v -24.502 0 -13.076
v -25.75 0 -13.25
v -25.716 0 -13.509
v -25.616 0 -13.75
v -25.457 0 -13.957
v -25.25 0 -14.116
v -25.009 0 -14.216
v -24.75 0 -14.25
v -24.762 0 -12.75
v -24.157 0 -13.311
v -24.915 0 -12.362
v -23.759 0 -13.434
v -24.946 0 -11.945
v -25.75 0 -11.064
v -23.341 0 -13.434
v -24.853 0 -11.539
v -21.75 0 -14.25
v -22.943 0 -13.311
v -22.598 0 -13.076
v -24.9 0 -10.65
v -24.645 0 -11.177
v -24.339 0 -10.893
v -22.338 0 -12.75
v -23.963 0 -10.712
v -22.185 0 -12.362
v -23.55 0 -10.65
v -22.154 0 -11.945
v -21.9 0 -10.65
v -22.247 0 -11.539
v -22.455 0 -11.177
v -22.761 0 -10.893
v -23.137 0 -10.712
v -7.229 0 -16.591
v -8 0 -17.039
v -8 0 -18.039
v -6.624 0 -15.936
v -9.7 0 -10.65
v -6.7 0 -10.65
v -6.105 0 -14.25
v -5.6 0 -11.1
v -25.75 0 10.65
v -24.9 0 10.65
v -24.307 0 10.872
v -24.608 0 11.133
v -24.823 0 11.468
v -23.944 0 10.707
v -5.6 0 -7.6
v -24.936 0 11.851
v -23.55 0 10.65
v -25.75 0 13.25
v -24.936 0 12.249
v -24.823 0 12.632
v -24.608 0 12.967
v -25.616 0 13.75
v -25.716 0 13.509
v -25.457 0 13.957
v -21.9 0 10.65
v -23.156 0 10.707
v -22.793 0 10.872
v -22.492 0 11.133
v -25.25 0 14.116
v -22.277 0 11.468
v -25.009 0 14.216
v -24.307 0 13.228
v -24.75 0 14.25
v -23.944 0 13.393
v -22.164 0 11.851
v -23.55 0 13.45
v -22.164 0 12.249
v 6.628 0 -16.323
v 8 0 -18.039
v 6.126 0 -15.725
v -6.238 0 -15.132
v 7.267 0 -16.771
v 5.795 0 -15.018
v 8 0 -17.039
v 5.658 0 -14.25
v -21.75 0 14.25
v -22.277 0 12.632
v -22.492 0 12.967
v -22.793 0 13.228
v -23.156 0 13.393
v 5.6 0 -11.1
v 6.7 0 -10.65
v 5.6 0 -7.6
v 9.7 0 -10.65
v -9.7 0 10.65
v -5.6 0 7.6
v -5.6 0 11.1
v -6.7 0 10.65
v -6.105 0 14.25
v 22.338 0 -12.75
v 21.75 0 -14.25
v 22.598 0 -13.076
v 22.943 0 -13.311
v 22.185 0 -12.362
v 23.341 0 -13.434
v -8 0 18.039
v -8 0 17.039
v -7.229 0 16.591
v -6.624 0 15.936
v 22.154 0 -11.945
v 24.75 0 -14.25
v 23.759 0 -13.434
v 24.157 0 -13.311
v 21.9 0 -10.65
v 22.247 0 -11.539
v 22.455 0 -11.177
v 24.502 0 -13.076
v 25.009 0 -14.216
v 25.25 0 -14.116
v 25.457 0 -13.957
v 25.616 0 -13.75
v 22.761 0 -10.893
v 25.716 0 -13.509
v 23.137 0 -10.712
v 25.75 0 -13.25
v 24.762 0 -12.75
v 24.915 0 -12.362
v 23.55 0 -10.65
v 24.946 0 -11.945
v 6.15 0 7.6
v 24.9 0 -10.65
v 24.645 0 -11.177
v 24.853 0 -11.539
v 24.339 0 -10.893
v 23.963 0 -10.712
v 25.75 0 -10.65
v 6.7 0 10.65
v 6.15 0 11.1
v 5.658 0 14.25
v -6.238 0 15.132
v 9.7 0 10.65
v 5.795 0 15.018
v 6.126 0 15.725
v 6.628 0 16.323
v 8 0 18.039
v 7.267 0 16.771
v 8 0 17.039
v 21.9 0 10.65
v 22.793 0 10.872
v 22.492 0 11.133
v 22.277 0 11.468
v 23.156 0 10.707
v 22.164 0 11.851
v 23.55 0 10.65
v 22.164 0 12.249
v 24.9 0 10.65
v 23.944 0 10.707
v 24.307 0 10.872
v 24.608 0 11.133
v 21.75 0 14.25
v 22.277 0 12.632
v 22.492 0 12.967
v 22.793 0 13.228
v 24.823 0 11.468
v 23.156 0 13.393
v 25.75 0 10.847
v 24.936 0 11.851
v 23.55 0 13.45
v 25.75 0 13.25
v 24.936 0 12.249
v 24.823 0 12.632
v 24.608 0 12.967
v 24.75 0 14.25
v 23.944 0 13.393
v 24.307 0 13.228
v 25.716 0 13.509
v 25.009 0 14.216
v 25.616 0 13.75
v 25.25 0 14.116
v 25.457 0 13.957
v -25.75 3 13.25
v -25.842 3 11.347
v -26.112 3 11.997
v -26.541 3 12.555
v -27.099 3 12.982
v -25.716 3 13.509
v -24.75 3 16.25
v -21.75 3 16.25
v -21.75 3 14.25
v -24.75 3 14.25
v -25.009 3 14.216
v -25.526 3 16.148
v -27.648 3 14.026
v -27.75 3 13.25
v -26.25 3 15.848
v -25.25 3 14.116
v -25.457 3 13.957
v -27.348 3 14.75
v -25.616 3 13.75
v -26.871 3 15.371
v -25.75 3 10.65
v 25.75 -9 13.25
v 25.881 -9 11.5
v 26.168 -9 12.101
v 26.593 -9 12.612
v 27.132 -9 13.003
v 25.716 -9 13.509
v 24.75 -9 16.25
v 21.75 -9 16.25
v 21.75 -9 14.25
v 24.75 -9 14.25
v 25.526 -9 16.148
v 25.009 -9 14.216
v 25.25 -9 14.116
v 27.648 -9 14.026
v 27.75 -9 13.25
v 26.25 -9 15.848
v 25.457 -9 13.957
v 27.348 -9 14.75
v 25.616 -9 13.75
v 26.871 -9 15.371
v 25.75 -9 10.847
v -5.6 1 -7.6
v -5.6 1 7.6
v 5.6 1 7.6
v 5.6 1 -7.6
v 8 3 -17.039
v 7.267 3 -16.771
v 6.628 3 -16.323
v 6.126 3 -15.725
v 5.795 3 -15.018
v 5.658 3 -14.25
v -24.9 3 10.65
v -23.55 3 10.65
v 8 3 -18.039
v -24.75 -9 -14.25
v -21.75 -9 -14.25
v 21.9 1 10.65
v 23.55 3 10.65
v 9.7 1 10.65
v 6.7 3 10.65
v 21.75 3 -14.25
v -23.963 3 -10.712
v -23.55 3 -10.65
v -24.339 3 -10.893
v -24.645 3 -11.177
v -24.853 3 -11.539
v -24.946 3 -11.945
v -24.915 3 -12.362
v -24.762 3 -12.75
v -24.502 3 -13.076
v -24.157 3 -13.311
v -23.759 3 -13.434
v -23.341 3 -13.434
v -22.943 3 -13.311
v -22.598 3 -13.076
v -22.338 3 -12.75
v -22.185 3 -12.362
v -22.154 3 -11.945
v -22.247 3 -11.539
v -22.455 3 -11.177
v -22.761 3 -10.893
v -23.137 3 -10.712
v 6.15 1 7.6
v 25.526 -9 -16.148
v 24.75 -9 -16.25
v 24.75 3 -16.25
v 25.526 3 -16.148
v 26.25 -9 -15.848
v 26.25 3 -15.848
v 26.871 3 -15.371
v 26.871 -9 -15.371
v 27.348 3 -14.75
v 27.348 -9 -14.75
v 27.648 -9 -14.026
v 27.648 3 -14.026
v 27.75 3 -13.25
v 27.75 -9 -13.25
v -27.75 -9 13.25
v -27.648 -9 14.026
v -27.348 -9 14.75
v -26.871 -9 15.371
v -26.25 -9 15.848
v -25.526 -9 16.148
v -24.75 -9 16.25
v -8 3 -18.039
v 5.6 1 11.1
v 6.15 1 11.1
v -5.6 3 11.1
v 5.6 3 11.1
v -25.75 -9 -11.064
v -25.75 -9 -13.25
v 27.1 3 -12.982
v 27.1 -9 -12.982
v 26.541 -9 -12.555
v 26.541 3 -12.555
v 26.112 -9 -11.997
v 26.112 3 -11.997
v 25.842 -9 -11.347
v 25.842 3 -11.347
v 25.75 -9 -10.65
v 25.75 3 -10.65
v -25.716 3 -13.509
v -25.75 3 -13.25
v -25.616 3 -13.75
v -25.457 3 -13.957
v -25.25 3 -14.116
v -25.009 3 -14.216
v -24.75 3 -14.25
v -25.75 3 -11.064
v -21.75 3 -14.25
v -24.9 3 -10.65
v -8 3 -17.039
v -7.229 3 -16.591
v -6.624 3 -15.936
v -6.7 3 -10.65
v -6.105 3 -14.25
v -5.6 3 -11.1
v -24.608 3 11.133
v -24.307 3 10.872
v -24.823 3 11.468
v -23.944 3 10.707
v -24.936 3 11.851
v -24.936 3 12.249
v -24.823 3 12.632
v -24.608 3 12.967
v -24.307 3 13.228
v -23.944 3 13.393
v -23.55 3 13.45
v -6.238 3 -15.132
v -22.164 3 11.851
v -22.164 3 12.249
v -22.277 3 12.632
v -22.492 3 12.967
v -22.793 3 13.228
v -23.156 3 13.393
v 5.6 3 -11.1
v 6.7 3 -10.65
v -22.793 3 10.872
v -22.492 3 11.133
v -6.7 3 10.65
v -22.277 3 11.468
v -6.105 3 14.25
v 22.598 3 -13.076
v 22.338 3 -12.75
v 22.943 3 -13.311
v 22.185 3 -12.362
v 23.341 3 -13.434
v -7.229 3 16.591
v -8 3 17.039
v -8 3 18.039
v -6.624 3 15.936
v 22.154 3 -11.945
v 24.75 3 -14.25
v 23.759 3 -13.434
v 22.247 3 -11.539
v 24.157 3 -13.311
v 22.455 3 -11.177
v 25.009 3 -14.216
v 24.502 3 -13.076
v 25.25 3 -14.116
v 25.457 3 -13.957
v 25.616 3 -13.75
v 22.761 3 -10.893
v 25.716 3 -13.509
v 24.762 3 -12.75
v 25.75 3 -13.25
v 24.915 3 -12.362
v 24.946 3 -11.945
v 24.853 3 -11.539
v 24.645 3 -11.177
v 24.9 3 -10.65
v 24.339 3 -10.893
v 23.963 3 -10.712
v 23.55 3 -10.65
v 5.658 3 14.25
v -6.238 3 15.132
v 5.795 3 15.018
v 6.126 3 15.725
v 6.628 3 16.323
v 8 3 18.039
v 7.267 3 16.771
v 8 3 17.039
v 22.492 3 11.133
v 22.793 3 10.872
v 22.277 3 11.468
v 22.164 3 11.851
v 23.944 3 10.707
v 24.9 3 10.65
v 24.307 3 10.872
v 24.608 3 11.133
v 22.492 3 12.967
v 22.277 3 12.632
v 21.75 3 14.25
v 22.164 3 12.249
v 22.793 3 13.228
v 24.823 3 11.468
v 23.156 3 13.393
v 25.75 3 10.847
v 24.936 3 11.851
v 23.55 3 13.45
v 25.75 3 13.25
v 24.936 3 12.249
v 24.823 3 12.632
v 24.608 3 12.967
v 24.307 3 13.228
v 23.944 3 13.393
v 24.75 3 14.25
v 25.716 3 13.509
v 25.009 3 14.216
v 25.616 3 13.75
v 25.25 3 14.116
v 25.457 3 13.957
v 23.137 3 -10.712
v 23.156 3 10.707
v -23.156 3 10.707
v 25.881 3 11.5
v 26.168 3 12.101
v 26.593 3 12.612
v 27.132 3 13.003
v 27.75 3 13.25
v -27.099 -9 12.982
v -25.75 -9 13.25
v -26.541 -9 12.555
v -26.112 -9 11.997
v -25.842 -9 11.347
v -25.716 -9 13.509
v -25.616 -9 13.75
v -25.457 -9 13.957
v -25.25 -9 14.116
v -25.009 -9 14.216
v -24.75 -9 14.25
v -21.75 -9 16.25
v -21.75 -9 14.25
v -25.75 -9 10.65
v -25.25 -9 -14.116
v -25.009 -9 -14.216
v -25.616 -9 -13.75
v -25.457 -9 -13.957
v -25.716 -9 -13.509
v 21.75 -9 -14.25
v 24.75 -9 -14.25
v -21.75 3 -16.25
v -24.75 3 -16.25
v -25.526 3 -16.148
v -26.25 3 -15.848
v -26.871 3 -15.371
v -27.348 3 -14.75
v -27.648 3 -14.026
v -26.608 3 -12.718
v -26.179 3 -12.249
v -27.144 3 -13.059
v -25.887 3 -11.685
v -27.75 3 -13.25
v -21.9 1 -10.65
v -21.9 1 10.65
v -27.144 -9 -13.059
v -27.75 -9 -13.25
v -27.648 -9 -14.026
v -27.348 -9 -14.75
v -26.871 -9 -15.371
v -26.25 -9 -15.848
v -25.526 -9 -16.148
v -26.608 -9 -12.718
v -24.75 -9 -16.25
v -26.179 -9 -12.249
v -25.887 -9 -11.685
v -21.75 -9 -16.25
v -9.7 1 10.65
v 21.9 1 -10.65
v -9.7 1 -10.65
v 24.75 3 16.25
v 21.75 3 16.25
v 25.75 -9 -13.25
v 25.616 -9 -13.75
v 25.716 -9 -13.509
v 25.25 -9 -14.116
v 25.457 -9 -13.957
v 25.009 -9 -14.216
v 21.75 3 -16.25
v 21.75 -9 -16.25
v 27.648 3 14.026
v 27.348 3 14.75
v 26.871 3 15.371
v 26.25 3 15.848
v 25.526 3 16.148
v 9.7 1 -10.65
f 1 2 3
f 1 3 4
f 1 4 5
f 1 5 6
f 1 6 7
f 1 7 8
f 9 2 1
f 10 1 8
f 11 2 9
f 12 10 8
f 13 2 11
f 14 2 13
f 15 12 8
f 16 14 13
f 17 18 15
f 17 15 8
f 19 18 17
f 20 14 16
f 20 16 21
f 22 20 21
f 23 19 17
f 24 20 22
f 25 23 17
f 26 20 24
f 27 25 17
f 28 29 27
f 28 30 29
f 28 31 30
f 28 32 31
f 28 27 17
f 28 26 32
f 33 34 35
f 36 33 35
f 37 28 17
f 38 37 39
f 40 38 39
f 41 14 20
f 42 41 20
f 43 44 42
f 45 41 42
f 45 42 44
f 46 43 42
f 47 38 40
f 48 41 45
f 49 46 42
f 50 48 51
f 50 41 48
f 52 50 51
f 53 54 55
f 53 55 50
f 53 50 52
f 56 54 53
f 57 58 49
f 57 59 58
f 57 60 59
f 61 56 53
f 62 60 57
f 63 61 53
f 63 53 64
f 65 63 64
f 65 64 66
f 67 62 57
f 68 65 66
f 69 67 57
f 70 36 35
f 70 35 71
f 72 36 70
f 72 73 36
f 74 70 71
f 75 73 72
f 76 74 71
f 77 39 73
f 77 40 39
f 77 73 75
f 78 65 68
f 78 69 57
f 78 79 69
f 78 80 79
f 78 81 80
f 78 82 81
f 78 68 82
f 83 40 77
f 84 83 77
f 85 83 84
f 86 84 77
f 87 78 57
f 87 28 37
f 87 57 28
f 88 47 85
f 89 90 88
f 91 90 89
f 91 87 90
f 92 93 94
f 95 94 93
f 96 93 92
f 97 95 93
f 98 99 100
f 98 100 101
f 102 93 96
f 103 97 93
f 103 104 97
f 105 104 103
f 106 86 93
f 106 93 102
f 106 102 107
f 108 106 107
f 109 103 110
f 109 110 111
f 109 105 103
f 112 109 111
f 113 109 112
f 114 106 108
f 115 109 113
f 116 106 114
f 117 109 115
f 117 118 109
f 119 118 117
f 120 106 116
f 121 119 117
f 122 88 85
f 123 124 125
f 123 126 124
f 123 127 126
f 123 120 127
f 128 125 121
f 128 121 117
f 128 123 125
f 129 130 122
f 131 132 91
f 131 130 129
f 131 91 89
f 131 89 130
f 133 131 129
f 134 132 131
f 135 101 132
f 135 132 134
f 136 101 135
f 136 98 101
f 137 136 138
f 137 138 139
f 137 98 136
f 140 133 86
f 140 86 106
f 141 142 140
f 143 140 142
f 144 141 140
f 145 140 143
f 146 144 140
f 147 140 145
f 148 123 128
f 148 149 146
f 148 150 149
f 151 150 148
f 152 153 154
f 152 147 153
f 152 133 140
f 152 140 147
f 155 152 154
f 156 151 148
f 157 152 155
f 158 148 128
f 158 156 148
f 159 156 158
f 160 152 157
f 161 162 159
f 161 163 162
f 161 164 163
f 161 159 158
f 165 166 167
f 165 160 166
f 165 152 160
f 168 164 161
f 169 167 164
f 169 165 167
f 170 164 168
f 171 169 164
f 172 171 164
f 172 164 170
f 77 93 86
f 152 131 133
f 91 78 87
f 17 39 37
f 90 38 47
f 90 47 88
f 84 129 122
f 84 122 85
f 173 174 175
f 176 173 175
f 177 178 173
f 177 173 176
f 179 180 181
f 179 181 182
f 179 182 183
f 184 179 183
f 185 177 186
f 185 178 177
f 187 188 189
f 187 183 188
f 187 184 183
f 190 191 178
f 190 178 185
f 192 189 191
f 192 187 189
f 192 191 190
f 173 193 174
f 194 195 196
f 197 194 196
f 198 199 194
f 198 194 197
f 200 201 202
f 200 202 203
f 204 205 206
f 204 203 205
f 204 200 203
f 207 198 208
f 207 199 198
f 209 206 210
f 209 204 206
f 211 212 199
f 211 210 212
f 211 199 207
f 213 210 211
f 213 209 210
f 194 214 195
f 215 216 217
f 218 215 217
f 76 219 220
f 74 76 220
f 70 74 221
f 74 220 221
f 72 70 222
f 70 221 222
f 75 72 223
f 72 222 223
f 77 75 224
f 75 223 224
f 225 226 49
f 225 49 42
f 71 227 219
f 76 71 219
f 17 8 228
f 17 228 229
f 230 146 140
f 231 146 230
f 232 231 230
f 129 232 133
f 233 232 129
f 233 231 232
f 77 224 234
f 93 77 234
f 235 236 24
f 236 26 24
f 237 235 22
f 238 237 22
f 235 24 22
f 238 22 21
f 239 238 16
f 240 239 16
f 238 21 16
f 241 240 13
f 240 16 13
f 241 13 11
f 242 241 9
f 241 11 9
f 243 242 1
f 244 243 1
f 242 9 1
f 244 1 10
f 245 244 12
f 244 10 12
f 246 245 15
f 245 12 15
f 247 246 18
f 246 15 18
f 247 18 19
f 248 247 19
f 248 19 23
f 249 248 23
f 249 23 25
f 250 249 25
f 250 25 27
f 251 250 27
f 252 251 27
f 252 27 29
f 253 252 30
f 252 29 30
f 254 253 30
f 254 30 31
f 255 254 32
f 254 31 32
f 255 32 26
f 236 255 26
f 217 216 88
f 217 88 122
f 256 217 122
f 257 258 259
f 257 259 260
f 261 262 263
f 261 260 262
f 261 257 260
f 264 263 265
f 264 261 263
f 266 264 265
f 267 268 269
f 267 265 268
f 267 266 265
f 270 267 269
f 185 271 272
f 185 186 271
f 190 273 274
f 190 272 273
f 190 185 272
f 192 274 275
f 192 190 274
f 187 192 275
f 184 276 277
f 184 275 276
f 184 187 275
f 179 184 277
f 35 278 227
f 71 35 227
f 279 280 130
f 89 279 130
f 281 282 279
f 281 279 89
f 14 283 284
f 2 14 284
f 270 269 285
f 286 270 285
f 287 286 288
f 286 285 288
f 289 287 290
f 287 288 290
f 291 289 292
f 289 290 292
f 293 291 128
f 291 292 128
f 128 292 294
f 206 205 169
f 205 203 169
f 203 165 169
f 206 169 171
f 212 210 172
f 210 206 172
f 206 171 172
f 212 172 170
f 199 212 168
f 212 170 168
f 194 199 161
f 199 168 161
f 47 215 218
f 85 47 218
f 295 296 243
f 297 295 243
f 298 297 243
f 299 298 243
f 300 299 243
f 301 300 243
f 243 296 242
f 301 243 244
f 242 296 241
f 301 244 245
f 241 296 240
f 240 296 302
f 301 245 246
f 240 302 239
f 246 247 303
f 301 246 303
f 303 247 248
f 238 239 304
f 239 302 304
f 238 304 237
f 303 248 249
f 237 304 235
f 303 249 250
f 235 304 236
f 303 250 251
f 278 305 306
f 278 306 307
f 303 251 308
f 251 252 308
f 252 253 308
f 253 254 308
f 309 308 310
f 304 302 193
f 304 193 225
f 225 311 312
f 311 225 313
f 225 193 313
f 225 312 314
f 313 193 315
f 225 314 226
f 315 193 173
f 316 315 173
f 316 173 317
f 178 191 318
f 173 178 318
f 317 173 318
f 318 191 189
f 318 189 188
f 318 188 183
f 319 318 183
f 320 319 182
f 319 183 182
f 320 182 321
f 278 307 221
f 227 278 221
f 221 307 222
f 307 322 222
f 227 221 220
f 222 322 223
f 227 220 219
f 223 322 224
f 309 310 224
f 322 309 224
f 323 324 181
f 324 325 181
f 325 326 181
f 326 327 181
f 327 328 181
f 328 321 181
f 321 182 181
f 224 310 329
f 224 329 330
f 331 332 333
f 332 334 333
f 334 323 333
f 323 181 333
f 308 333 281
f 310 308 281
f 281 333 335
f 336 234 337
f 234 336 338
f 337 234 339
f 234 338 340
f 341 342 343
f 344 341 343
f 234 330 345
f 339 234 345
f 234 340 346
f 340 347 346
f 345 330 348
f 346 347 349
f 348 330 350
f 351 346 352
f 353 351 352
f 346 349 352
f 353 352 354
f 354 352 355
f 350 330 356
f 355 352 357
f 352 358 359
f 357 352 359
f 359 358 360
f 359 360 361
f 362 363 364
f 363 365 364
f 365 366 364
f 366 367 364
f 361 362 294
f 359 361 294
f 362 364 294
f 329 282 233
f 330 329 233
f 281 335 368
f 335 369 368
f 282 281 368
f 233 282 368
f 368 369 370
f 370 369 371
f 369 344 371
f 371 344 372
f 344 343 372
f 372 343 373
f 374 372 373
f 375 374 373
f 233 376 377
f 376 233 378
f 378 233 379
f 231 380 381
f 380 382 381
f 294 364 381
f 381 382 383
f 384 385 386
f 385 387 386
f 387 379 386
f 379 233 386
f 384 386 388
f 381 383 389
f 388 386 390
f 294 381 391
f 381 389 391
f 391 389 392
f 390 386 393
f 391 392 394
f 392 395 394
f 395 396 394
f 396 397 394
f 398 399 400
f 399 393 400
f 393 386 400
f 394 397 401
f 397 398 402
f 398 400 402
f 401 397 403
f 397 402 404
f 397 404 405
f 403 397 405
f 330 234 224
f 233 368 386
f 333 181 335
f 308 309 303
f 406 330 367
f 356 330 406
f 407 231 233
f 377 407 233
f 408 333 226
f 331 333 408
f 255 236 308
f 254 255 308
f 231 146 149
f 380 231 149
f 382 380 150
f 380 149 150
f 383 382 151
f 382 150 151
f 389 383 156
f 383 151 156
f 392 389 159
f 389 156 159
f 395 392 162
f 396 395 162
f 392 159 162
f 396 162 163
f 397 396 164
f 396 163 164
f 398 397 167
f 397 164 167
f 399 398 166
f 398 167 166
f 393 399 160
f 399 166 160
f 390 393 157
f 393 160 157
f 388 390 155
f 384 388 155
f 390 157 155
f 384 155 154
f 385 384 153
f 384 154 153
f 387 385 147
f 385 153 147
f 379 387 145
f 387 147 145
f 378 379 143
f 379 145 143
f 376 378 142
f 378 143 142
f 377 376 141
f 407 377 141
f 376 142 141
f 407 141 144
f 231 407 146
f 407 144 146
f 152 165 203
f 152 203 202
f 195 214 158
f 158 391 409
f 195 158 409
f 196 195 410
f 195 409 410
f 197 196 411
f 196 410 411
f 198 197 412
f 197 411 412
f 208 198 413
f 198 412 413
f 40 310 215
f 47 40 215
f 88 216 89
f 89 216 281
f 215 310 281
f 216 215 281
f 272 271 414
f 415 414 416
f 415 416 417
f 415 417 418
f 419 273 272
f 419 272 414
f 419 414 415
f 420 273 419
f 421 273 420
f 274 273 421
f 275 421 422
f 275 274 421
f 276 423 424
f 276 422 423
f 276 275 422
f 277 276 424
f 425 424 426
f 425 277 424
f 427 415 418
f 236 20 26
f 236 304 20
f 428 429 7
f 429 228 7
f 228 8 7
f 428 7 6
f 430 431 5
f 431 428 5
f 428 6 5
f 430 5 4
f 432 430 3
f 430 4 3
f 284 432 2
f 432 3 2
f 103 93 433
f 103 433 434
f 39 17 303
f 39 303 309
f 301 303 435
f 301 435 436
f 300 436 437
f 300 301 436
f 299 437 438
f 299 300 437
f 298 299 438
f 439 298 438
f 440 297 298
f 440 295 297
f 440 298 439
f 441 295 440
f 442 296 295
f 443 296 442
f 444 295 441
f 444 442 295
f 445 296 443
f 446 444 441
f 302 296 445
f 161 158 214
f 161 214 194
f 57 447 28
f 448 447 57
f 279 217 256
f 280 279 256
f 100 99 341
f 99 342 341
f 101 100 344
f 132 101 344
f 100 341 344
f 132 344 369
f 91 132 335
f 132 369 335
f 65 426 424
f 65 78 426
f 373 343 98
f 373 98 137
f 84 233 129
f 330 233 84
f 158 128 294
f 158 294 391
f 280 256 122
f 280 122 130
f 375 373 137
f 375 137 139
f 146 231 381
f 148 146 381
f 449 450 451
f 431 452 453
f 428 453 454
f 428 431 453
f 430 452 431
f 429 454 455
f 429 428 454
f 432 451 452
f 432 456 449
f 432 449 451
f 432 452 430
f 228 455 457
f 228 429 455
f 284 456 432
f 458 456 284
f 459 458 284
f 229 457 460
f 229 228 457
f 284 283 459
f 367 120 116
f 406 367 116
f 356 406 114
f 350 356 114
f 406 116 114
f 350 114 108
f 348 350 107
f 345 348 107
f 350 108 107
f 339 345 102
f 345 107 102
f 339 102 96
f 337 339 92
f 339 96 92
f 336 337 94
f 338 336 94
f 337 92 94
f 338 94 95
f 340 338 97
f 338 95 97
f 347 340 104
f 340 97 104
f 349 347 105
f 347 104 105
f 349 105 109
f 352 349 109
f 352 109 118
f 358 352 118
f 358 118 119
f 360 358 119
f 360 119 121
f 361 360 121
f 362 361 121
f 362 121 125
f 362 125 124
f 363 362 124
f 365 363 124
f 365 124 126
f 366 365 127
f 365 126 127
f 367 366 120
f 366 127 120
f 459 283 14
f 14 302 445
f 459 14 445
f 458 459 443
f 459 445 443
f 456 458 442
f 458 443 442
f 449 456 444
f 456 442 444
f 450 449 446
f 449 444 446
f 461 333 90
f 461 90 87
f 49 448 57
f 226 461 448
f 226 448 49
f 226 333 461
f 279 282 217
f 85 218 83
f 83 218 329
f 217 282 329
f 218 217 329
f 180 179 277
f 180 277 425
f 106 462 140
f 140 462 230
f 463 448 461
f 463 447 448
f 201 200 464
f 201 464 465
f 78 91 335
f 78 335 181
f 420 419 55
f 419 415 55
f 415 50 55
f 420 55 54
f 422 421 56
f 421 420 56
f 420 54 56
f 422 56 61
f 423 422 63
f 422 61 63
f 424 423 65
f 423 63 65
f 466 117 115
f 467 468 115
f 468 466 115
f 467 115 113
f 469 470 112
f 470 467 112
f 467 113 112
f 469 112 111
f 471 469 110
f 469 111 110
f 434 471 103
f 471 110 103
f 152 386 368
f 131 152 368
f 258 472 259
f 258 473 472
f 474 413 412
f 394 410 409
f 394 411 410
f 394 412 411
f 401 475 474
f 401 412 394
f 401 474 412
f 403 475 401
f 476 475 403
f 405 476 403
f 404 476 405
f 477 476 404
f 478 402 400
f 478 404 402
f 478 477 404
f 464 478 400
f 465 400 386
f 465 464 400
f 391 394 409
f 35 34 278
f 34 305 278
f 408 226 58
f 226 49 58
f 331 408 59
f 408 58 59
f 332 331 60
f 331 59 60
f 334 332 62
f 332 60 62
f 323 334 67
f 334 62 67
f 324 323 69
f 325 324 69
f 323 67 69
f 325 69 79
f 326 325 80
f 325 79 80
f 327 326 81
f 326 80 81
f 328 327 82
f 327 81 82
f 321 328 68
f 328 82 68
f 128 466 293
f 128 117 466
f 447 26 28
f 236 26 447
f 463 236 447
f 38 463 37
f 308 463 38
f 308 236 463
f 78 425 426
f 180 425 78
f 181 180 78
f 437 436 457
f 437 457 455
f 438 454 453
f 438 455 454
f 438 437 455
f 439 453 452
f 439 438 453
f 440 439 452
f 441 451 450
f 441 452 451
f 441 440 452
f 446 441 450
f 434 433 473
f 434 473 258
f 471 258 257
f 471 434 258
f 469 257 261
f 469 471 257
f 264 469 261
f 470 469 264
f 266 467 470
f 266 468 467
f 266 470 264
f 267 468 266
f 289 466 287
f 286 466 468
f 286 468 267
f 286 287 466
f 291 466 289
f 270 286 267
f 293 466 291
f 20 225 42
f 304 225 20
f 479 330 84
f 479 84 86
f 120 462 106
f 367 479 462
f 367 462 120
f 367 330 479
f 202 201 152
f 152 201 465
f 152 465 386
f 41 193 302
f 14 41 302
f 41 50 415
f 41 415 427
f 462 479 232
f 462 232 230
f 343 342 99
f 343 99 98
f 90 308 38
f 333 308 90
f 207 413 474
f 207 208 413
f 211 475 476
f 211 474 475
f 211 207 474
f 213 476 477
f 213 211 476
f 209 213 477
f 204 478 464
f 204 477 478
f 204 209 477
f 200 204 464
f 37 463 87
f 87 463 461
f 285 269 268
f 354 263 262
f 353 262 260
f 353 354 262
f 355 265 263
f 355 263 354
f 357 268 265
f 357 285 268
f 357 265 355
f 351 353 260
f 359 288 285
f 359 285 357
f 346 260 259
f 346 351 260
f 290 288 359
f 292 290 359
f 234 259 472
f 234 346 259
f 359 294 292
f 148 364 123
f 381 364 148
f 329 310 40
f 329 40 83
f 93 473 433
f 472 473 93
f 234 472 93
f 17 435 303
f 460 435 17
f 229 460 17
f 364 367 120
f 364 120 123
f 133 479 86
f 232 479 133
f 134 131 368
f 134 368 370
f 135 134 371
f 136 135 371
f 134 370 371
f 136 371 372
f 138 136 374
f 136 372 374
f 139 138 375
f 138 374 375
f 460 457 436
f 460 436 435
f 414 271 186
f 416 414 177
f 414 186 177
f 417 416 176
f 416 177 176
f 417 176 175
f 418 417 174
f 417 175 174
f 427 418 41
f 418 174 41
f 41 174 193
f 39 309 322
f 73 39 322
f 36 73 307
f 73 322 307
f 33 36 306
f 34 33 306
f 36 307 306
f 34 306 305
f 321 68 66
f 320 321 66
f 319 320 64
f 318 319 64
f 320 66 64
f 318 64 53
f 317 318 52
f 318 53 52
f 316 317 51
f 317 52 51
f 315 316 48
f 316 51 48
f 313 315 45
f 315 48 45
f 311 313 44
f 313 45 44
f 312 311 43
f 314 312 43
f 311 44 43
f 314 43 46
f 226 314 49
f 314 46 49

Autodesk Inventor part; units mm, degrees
ref_plane "YZ Plane" through (0, 0, 0) normal (1, 0, 0) x (0, 1, 0)
ref_plane "XZ Plane" through (0, 0, 0) normal (0, 1, 0) x (-1, 0, 0)
ref_plane "XY Plane" through (0, 0, 0) normal (0, 0, 1) x (1, 0, 0)
sketch "Sketch1" plane through (0, 0, 0) normal (0, 1, 0) x (-1, 0, 0)
  line L0 (-25.75, 13.25) -> (-25.75, -13.25)
  line L1 (-24.75, -14.25) -> (24.75, -14.25)
  line L2 (25.75, -13.25) -> (25.75, 13.25)
  line L3 (24.75, 14.25) -> (-24.75, 14.25)
  arc A0 (-25.75, -13.25) -> (-24.75, -14.25) centre (-24.75, -13.25) ccw
  arc A1 (-24.75, 14.25) -> (-25.75, 13.25) centre (-24.75, 13.25) ccw
  arc A2 (25.75, 13.25) -> (24.75, 14.25) centre (24.75, 13.25) ccw
  arc A3 (24.75, -14.25) -> (25.75, -13.25) centre (24.75, -13.25) ccw
  line L4 (24.75, -16.25) -> (-24.75, -16.25)
  arc A4 (-27.75, -13.25) -> (-24.75, -16.25) centre (-24.75, -13.25) ccw
  line L5 (-27.75, -13.25) -> (-27.75, 13.25)
  arc A5 (-24.75, 16.25) -> (-27.75, 13.25) centre (-24.75, 13.25) ccw
  line L6 (-24.75, 16.25) -> (24.75, 16.25)
  arc A6 (27.75, 13.25) -> (24.75, 16.25) centre (24.75, 13.25) ccw
  line L7 (27.75, 13.25) -> (27.75, -13.25)
  arc A7 (24.75, -16.25) -> (27.75, -13.25) centre (24.75, -13.25) ccw
  line L8 (21.75, -16.25) -> (21.75, -14.25)
  line L9 (27.75, -10.25) -> (25.75, -10.25)
  line L10 (25.75, 10.25) -> (27.75, 10.25)
  line L11 (21.75, 14.25) -> (21.75, 16.25)
  line L12 (-21.75, 14.25) -> (-21.75, 16.25)
  line L13 (-25.75, 10.25) -> (-27.75, 10.25)
  line L14 (-25.75, -10.25) -> (-27.75, -10.25)
  line L15 (-21.75, -16.25) -> (-21.75, -14.25)
  line L16 (-21.75, -14.25) -> (-17.75, -14.25)
  arc A8 (-17.75, -14.25) -> (-21.75, -16.25) centre (-15.3911, -23.9678) ccw
  line L17 (-21.75, 14.25) -> (-17.75, 14.25)
  arc A9 (-21.75, 16.25) -> (-17.75, 14.25) centre (-15.3911, 23.9678) ccw
  line L18 (-25.75, -10.25) -> (-25.75, -6.2495)
  line L19 (-25.75, 10.25) -> (-25.75, 6.25)
  arc A10 (-27.75, -10.25) -> (-25.75, -6.2495) centre (-35.468, -3.8913) ccw
  arc A11 (-25.75, 6.25) -> (-27.75, 10.25) centre (-35.4678, 3.8911) ccw
  line L20 (25.75, -10.25) -> (25.75, -6.2495)
  arc A12 (25.75, -6.2495) -> (27.75, -10.25) centre (35.468, -3.8913) ccw
  line L21 (25.75, 10.25) -> (25.75, 6.25)
  arc A13 (27.75, 10.25) -> (25.75, 6.25) centre (35.4678, 3.8911) ccw
  point P0 (0, 0)
  point P1 (-25.75, 14.25)
  point P2 (-25.75, -14.25)
  point P3 (25.75, -14.25)
  point P4 (21.75, 15.25)
  point P5 (-26.75, 10.25)
  dimension "d0" = 28.5
  dimension "d1" = 51.5
  dimension "d2" = 14.25
  dimension "d3" = 25.75
  dimension "d4" = 1
  dimension "d5" = 2
  dimension "d6" = 3
  dimension "d7" = 3
  dimension "d8" = 3
  dimension "d9" = 3
  dimension "d10" = 3
  dimension "d11" = 3
  dimension "d12" = 3
  dimension "d13" = 3
  dimension "d19" = 4
  dimension "d20" = 10
  dimension "d21" = 10
  dimension "d22" = 4
  dimension "d23" = 10
  dimension "d24" = 10
  dimension "d25" = 10
  dimension "d26" = 10
extrude "Extrusion1" add sketch "Sketch1" along normal blind 3.0001 contours L0 L13 L5 A5 L6 L12 L3 A1 | L0 A11 L13 | L12 A9 L3 | L0 L14 A10 | L14 L0 A0 L1 L15 L4 A4 L5 | L11 L6 A6 L7 L10 L2 A2 L3 | L15 L1 A8 | L8 L1 A3 L2 L9 L7 A7 L4 | L10 A13 L2 | L9 L2 A12
sketch "Sketch2" plane through (0, 0, 0) normal (0, -1, 0) x (1, 0, 0)
  line L0 (24.75, 14.25) -> (-24.75, 14.25) projected
  arc A0 (25.75, 13.25) -> (24.75, 14.25) centre (24.75, 13.25) ccw projected
  line L1 (-24.75, 14.25) -> (24.75, 14.25)
  line L2 (25.75, -13.25) -> (25.75, 13.25) projected
  line L3 (-24.75, -14.25) -> (24.75, -14.25) projected
  arc A1 (-25.75, -13.25) -> (-24.75, -14.25) centre (-24.75, -13.25) ccw projected
  arc A2 (24.75, -14.25) -> (25.75, -13.25) centre (24.75, -13.25) ccw projected
  line L4 (-25.75, 13.25) -> (-25.75, -13.25) projected
  arc A3 (-24.75, 14.25) -> (-25.75, 13.25) centre (-24.75, 13.25) ccw projected
  line L5 (24.75, -16.25) -> (-24.75, -16.25)
  arc A4 (-27.75, -13.25) -> (-24.75, -16.25) centre (-24.75, -13.25) ccw
  line L6 (-27.75, -13.25) -> (-27.75, 13.25)
  arc A5 (-24.75, 16.25) -> (-27.75, 13.25) centre (-24.75, 13.25) ccw
  line L7 (-24.75, 16.25) -> (24.75, 16.25)
  arc A6 (27.75, 13.25) -> (24.75, 16.25) centre (24.75, 13.25) ccw
  line L8 (27.75, 13.25) -> (27.75, -13.25)
  arc A7 (24.75, -16.25) -> (27.75, -13.25) centre (24.75, -13.25) ccw
  point P0 (0, 0)
  dimension "d16" = 2
extrude "Extrusion2" add sketch "Sketch2" against normal blind 3 contours A0 L2 A2 L3 A1 L4 A3 L0
sketch "Sketch3" plane through (0, 3, 0) normal (0, 1, 0) x (1, 0, 0)
  line L0 (6.7, 10.65) -> (24.9, 10.65)
  line L1 (24.9, 10.65) -> (24.9, -10.65)
  line L2 (24.9, -10.65) -> (6.7, -10.65)
  line L3 (6.7, -10.65) -> (6.7, 10.65)
  line L4 (-5.6, 11.1) -> (5.6, 11.1)
  line L5 (5.6, 11.1) -> (5.6, -11.1)
  line L6 (5.6, -11.1) -> (-5.6, -11.1)
  line L7 (-5.6, -11.1) -> (-5.6, 11.1)
  line L8 (17.75, 14.25) -> (-21.75, 14.25) projected
  line L9 (-21.75, -14.25) -> (17.75, -14.25) projected
  line L10 (-6.7, -10.65) -> (-24.9, -10.65)
  line L11 (-6.7, 10.65) -> (-6.7, -10.65)
  line L12 (-24.9, 10.65) -> (-6.7, 10.65)
  line L13 (-24.9, -10.65) -> (-24.9, 10.65)
  point P0 (0, 0)
  dimension "d27" = 18.2
  dimension "d28" = 21.3
  dimension "d29" = 10.65
  dimension "d30" = 6.7
  dimension "d31" = 11.2
  dimension "d32" = 22.2
  dimension "d33" = 5.6
  dimension "d34" = 11.1
  dimension "d69" = 360
extrude "Extrusion3" cut sketch "Sketch3" against normal blind 2
sketch "Sketch4" plane through (0, 3, 0) normal (0, 1, 0) x (1, 0, 0)
  line L0 (-25.75, 6.2495) -> (-25.75, 13.25) projected
  line L1 (-25.75, 12.05) -> (-23.55, 12.05)
  line L2 (-24.75, 14.25) -> (-21.75, 14.25) projected
  line L3 (-23.55, 14.25) -> (-23.55, 12.05)
  circle A0 centre (-23.55, 12.05) radius 1.4
  line L4 (17.75, 14.25) -> (24.75, 14.25) projected
  line L5 (23.55, 14.25) -> (23.55, 12.05)
  line L6 (25.75, 13.25) -> (25.75, 6.2495) projected
  line L7 (25.75, 12.05) -> (23.55, 12.05)
  line L8 (24.75, -14.25) -> (17.75, -14.25) projected
  line L9 (23.55, -14.25) -> (23.55, -12.05)
  line L10 (25.75, -6.25) -> (25.75, -13.25) projected
  line L11 (25.75, -12.05) -> (23.55, -12.05)
  line L12 (-25.75, -13.25) -> (-25.75, -6.25) projected
  line L13 (-25.75, -12.05) -> (-23.55, -12.05)
  line L14 (-21.75, -14.25) -> (-24.75, -14.25) projected
  line L15 (-23.55, -14.25) -> (-23.55, -12.05)
  point P0 (0, 0)
  dimension "d39" = 2.2
  dimension "d40" = 2.2
  dimension "d41" = 2.8
  dimension "d42" = 2.2
  dimension "d43" = 2.2
  dimension "d44" = 2.2
  dimension "d45" = 2.2
  dimension "d46" = 2.2
  dimension "d48" = 2.2
hole "Hole1" at (-23.55, 3, -12.05) at (23.55, 3, -12.05) at (23.55, 3, 12.05) at (-23.55, 3, 12.05) direction (0, -1, 0) diameter 2.8 end through all
sketch "Sketch5" plane through (0, 0, 0) normal (0, -1, 0) x (1, 0, 0)
  line L0 (25.75, -13.25) -> (25.75, -6.2495) projected
  arc A0 (25.75, -6.2495) -> (27.75, -10.25) centre (35.468, -3.8913) ccw projected
  line L1 (27.75, -10.25) -> (27.75, -13.25) projected
  arc A1 (24.75, -16.25) -> (27.75, -13.25) centre (24.75, -13.25) ccw projected
  line L2 (24.75, -16.25) -> (21.75, -16.25) projected
  arc A2 (21.75, -16.25) -> (17.75, -14.25) centre (15.3911, -23.9678) ccw projected
  line L3 (17.75, -14.25) -> (24.75, -14.25) projected
  arc A3 (24.75, -14.25) -> (25.75, -13.25) centre (24.75, -13.25) ccw projected
  line L4 (25.75, 6.25) -> (25.75, 13.25) projected
  arc A4 (27.75, 10.25) -> (25.75, 6.25) centre (35.4678, 3.8911) ccw projected
  line L5 (27.75, 13.25) -> (27.75, 10.25) projected
  arc A5 (27.75, 13.25) -> (24.75, 16.25) centre (24.75, 13.25) ccw projected
  arc A6 (25.75, 13.25) -> (24.75, 14.25) centre (24.75, 13.25) ccw projected
  line L6 (24.75, 14.25) -> (17.75, 14.25) projected
  arc A7 (17.75, 14.25) -> (21.75, 16.25) centre (15.3911, 23.9678) ccw projected
  line L7 (21.75, 16.25) -> (24.75, 16.25) projected
  line L8 (-21.75, 14.25) -> (-24.75, 14.25) projected
  line L9 (-21.75, 16.25) -> (-21.75, 14.25) projected
  line L10 (-24.75, 16.25) -> (-21.75, 16.25) projected
  arc A8 (-24.75, 16.25) -> (-27.75, 13.25) centre (-24.75, 13.25) ccw projected
  line L11 (-27.75, 10.25) -> (-27.75, 13.25) projected
  arc A9 (-25.75, 6.25) -> (-27.75, 10.25) centre (-35.4678, 3.8911) ccw projected
  line L12 (-25.75, 13.25) -> (-25.75, 6.25) projected
  arc A10 (-24.75, 14.25) -> (-25.75, 13.25) centre (-24.75, 13.25) ccw projected
  line L13 (-27.75, -13.25) -> (-27.75, -10.25) projected
  arc A11 (-27.75, -13.25) -> (-24.75, -16.25) centre (-24.75, -13.25) ccw projected
  line L14 (-21.75, -16.25) -> (-24.75, -16.25) projected
  line L15 (-21.75, -14.25) -> (-21.75, -16.25) projected
  line L16 (-24.75, -14.25) -> (-21.75, -14.25) projected
  arc A12 (-25.75, -13.25) -> (-24.75, -14.25) centre (-24.75, -13.25) ccw projected
  line L17 (-25.75, -6.2495) -> (-25.75, -13.25) projected
  arc A13 (-27.75, -10.25) -> (-25.75, -6.2495) centre (-35.468, -3.8913) ccw projected
  point P0 (0, 0)
extrude "Extrusion4" add sketch "Sketch5" along normal blind 9
sketch "Sketch6" plane through (0, 3, 0) normal (0, 1, 0) x (1, 0, 0)
  line L0 (17.75, 14.25) -> (-21.75, 14.25) projected
  arc A0 (-6.1051, 14.25) -> (-8, 17.039) centre (-9.1051, 14.25) ccw
  line L1 (-8, 17.039) -> (-8, 18.039)
  line L2 (-8, 18.039) -> (8, 18.039)
  line L3 (8, 18.039) -> (8, 17.039)
  arc A1 (8, 17.039) -> (5.6575, 14.25) centre (8.6543, 14.1113) ccw
  line L4 (-5.6, 11.1) -> (5.6, 11.1) projected
  line L5 (-24.5, 0) -> (24.9, 0)
  line L6 (24.9, 10.65) -> (24.9, -10.65) projected
  arc A2 (-8, -17.039) -> (-6.1051, -14.25) centre (-9.1051, -14.25) ccw
  line L7 (-8, -17.039) -> (-8, -18.039)
  line L8 (-8, -18.039) -> (8, -18.039)
  line L9 (8, -18.039) -> (8, -17.039)
  arc A3 (5.6575, -14.25) -> (8, -17.039) centre (8.6543, -14.1113) ccw
  line L10 (-6.1051, -14.25) -> (5.6575, -14.25)
  line L11 (-6.1051, 14.25) -> (5.6575, 14.25)
  point P0 (0, 0)
  point P1 (0, 11.1)
  dimension "d58" = 3
  dimension "d59" = 1
  dimension "d60" = 1
  dimension "d61" = 3
  dimension "d62" = 16
  dimension "d63" = 8
extrude "Extrusion5" add sketch "Sketch6" against normal blind 3
sketch "Sketch7" plane through (0, 1, 0) normal (0, 1, 0) x (1, 0, 0)
  line L0 (-24.9, -10.65) -> (-24.9, 10.65) projected
  line L1 (-24.9, 10.65) -> (-21.9, 10.65)
  line L2 (-23.55, 10.65) -> (-6.7, 10.65) projected
  line L3 (-21.9, 10.65) -> (-21.9, -10.65)
  line L4 (-6.7, -10.65) -> (-23.55, -10.65) projected
  line L5 (-21.9, -10.65) -> (-24.9, -10.65)
  line L6 (-24.9, 10.65) -> (-24.9, -10.65)
  line L7 (-6.7, 10.65) -> (-6.7, -10.65) projected
  line L8 (-6.7, 10.65) -> (-9.7, 10.65)
  line L9 (-9.7, 10.65) -> (-9.7, -10.65)
  line L10 (-9.7, -10.65) -> (-6.7, -10.65)
  line L11 (-6.7, 10.65) -> (-6.7, -10.65)
  line L12 (-5.6, 11.1) -> (5.6, 11.1) projected
  line L13 (-5.6, 11.1) -> (-5.6, 7.6)
  line L14 (-5.6, 7.6) -> (5.6, 7.6)
  line L15 (5.6, 7.6) -> (5.6, 11.1)
  line L16 (5.6, 11.1) -> (-5.6, 11.1)
  line L17 (5.6, -11.1) -> (-5.6, -11.1) projected
  line L18 (-5.6, -11.1) -> (-5.6, -7.6)
  line L19 (-5.6, -11.1) -> (-5.6, 11.1) projected
  line L20 (-5.6, -7.6) -> (6.15, -7.6)
  line L21 (6.15, -7.6) -> (6.15, -11.1)
  line L22 (6.15, -11.1) -> (-5.6, -11.1)
  line L23 (6.7, 10.65) -> (23.55, 10.65) projected
  line L24 (6.7, 10.65) -> (9.7, 10.65)
  line L25 (9.7, 10.65) -> (9.7, -10.65)
  line L26 (23.55, -10.65) -> (6.7, -10.65) projected
  line L27 (6.7, -10.65) -> (6.7, 10.65)
  line L28 (23.55, 10.65) -> (24.9, 10.65) projected
  line L29 (24.9, 10.65) -> (21.9, 10.65)
  line L30 (21.9, 10.65) -> (21.9, -10.65)
  line L31 (24.9, 10.65) -> (24.9, -10.65) projected
  line L32 (24.9, -10.65) -> (24.9, 10.65)
  line L33 (24.9, 10.65) -> (24.9, -10.65)
  line L34 (21.9, -10.65) -> (24.9, -10.65)
  line L35 (21.9, 10.65) -> (24.9, 10.65)
  point P0 (0, 0)
  point P1 (5.875, -11.3)
  point P2 (-23.55, -10.65)
  dimension "d71" = 3
  dimension "d72" = 3
  dimension "d73" = 3.5
  dimension "d74" = 3.5
  dimension "d75" = 3
  dimension "d76" = 3
extrude "Extrusion6" cut sketch "Sketch7" against normal through all contours L0 L1 L3 L4 L5 | L9 L2 L7 L4 | L20 L21 L22 L17 L18 | L12 L15 L14 L13 | L23 L25 L26 L27 | L23 L28 L31 L34 L26 L30
sketch "Sketch9" plane through (0, 3.0001, 0) normal (0, 1, 0) x (1, 0, 0)
  line L0 (-24.9, 10.65) -> (-23.55, 10.65) projected
  line L1 (-24.9, 10.65) -> (-25.75, 10.65)
  line L2 (-25.75, 6.2495) -> (-25.75, 13.25) projected
  line L3 (-27.75, 13.25) -> (-27.75, 10.25) projected
  arc A0 (-25.75, 10.65) -> (-27.75, 13.25) centre (-28.1706, 10.8572) ccw
  line L4 (-25.75, 10.65) -> (-25.75, -10.65)
  line L5 (-25.75, -13.25) -> (-25.75, -6.25) projected
  line L6 (-25.75, -10.65) -> (25.7428, -10.65)
  line L7 (23.55, -10.65) -> (6.7, -10.65) projected
  line L8 (25.75, 13.25) -> (25.75, 6.2495) projected
  line L9 (25.75, 10.65) -> (-25.75, 10.65)
  arc A1 (27.75, 13.25) -> (24.75, 16.25) centre (24.75, 13.25) ccw projected
  arc A2 (27.75, 13.25) -> (25.75, 10.65) centre (28.4412, 10.6491) ccw
  arc A3 (24.75, -16.25) -> (27.75, -13.25) centre (24.75, -13.25) ccw projected
  arc A4 (25.7428, -10.65) -> (27.75, -13.25) centre (28.4291, -10.6509) ccw
  line L10 (24.75, -14.25) -> (17.75, -14.25) projected
  line L11 (-27.75, -10.25) -> (-27.75, -13.25) projected
  arc A5 (-27.75, -13.25) -> (-25.75, -10.65) centre (-28.44, -10.65) ccw
  arc A6 (-25.75, 6.2495) -> (-27.75, 10.25) centre (-35.468, 3.8913) ccw projected
  arc A7 (-27.75, -10.25) -> (-25.75, -6.25) centre (-35.4678, -3.8911) ccw projected
  arc A8 (21.75, -16.25) -> (17.75, -14.25) centre (15.3911, -23.9678) ccw projected
  line L12 (21.75, -16.25) -> (24.75, -16.25) projected
  line L13 (27.75, -13.25) -> (27.75, -10.25) projected
  arc A9 (25.75, -6.25) -> (27.75, -10.25) centre (35.4678, -3.8911) ccw projected
  line L14 (25.75, -6.25) -> (25.75, -13.25) projected
  line L15 (25.75, 13.25) -> (25.75, 6.2495) projected
  arc A10 (27.75, 10.25) -> (25.75, 6.2495) centre (35.468, 3.8913) ccw projected
  line L16 (27.75, 10.25) -> (27.75, 13.25) projected
  line L17 (24.75, 16.25) -> (21.75, 16.25) projected
  arc A11 (17.75, 14.25) -> (21.75, 16.25) centre (15.3911, 23.9678) ccw projected
  line L18 (17.75, 14.25) -> (24.75, 14.25) projected
  line L19 (21.75, 16.25) -> (21.75, 14.25)
  line L20 (21.75, -16.25) -> (21.75, -14.25)
  point P0 (0, 0)
  point P1 (25.75, -10.848)
  point P2 (-25.75, 11.0644)
  dimension "d84" = 2.4295
  dimension "d86" = 0
extrude "Extrusion8" cut sketch "Sketch9" against normal through all contours L19 L18 A11 | A2 L16 A10 L8 | A8 L10 L20 | L14 A9 L13 A4 | L4 A5 L11 A7 | L2 A6 L3 A0
